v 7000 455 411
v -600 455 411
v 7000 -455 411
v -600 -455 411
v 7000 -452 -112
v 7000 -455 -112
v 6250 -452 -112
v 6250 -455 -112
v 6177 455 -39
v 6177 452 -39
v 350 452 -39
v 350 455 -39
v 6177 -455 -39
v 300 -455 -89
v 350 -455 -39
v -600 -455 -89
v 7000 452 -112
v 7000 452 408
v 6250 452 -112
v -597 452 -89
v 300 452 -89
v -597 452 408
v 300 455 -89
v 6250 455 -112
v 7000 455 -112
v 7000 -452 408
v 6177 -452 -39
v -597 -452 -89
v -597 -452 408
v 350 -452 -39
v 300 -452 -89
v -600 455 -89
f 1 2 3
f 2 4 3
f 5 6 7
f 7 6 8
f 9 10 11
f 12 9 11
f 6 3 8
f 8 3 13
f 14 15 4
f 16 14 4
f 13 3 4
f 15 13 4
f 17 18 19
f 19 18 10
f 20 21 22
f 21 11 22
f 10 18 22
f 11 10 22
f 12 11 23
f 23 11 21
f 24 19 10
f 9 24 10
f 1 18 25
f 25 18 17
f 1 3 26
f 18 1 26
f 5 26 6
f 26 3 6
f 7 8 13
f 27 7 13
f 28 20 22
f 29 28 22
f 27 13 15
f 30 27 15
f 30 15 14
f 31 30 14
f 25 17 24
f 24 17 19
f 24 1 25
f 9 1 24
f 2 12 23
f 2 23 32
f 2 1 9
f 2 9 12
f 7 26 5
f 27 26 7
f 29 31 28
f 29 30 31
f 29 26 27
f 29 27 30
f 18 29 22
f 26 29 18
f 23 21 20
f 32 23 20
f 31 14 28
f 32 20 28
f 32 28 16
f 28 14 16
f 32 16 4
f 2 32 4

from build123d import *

# Parameters (mm, degrees)
EXTRUDE032_DEPTH = 452
EXTRUDE012_DEPTH = 455


with BuildPart() as extrude032:
    # Sketch033 → Extrude032 (new body, symmetric)
    with BuildSketch(Plane.XZ):
        Polygon((-597, -89), (-597, 411), (7097, 411), (7097, -112), (6247, -112), (6189, -54), (335, -54), (300, -89), align=None)
    extrude(amount=EXTRUDE032_DEPTH, both=True)


with BuildPart() as extrude032_1:
    # Extrude032 placement: moved
    add(extrude032.part.moved(Location((0, 0, -3))))


with BuildPart() as cut003:
    # Sketch020 → Extrude012 (new body, symmetric)
    with BuildSketch(Plane.XZ):
        Polygon((-600, -89), (-600, 411), (7000, 411), (7000, -112), (6250, -112), (6177, -39), (350, -39), (300, -89), align=None)
    extrude(amount=EXTRUDE012_DEPTH, both=True)

    # Cut003: cut Extrude032
    add(extrude032_1.part, mode=Mode.SUBTRACT)


solid = cut003.part
